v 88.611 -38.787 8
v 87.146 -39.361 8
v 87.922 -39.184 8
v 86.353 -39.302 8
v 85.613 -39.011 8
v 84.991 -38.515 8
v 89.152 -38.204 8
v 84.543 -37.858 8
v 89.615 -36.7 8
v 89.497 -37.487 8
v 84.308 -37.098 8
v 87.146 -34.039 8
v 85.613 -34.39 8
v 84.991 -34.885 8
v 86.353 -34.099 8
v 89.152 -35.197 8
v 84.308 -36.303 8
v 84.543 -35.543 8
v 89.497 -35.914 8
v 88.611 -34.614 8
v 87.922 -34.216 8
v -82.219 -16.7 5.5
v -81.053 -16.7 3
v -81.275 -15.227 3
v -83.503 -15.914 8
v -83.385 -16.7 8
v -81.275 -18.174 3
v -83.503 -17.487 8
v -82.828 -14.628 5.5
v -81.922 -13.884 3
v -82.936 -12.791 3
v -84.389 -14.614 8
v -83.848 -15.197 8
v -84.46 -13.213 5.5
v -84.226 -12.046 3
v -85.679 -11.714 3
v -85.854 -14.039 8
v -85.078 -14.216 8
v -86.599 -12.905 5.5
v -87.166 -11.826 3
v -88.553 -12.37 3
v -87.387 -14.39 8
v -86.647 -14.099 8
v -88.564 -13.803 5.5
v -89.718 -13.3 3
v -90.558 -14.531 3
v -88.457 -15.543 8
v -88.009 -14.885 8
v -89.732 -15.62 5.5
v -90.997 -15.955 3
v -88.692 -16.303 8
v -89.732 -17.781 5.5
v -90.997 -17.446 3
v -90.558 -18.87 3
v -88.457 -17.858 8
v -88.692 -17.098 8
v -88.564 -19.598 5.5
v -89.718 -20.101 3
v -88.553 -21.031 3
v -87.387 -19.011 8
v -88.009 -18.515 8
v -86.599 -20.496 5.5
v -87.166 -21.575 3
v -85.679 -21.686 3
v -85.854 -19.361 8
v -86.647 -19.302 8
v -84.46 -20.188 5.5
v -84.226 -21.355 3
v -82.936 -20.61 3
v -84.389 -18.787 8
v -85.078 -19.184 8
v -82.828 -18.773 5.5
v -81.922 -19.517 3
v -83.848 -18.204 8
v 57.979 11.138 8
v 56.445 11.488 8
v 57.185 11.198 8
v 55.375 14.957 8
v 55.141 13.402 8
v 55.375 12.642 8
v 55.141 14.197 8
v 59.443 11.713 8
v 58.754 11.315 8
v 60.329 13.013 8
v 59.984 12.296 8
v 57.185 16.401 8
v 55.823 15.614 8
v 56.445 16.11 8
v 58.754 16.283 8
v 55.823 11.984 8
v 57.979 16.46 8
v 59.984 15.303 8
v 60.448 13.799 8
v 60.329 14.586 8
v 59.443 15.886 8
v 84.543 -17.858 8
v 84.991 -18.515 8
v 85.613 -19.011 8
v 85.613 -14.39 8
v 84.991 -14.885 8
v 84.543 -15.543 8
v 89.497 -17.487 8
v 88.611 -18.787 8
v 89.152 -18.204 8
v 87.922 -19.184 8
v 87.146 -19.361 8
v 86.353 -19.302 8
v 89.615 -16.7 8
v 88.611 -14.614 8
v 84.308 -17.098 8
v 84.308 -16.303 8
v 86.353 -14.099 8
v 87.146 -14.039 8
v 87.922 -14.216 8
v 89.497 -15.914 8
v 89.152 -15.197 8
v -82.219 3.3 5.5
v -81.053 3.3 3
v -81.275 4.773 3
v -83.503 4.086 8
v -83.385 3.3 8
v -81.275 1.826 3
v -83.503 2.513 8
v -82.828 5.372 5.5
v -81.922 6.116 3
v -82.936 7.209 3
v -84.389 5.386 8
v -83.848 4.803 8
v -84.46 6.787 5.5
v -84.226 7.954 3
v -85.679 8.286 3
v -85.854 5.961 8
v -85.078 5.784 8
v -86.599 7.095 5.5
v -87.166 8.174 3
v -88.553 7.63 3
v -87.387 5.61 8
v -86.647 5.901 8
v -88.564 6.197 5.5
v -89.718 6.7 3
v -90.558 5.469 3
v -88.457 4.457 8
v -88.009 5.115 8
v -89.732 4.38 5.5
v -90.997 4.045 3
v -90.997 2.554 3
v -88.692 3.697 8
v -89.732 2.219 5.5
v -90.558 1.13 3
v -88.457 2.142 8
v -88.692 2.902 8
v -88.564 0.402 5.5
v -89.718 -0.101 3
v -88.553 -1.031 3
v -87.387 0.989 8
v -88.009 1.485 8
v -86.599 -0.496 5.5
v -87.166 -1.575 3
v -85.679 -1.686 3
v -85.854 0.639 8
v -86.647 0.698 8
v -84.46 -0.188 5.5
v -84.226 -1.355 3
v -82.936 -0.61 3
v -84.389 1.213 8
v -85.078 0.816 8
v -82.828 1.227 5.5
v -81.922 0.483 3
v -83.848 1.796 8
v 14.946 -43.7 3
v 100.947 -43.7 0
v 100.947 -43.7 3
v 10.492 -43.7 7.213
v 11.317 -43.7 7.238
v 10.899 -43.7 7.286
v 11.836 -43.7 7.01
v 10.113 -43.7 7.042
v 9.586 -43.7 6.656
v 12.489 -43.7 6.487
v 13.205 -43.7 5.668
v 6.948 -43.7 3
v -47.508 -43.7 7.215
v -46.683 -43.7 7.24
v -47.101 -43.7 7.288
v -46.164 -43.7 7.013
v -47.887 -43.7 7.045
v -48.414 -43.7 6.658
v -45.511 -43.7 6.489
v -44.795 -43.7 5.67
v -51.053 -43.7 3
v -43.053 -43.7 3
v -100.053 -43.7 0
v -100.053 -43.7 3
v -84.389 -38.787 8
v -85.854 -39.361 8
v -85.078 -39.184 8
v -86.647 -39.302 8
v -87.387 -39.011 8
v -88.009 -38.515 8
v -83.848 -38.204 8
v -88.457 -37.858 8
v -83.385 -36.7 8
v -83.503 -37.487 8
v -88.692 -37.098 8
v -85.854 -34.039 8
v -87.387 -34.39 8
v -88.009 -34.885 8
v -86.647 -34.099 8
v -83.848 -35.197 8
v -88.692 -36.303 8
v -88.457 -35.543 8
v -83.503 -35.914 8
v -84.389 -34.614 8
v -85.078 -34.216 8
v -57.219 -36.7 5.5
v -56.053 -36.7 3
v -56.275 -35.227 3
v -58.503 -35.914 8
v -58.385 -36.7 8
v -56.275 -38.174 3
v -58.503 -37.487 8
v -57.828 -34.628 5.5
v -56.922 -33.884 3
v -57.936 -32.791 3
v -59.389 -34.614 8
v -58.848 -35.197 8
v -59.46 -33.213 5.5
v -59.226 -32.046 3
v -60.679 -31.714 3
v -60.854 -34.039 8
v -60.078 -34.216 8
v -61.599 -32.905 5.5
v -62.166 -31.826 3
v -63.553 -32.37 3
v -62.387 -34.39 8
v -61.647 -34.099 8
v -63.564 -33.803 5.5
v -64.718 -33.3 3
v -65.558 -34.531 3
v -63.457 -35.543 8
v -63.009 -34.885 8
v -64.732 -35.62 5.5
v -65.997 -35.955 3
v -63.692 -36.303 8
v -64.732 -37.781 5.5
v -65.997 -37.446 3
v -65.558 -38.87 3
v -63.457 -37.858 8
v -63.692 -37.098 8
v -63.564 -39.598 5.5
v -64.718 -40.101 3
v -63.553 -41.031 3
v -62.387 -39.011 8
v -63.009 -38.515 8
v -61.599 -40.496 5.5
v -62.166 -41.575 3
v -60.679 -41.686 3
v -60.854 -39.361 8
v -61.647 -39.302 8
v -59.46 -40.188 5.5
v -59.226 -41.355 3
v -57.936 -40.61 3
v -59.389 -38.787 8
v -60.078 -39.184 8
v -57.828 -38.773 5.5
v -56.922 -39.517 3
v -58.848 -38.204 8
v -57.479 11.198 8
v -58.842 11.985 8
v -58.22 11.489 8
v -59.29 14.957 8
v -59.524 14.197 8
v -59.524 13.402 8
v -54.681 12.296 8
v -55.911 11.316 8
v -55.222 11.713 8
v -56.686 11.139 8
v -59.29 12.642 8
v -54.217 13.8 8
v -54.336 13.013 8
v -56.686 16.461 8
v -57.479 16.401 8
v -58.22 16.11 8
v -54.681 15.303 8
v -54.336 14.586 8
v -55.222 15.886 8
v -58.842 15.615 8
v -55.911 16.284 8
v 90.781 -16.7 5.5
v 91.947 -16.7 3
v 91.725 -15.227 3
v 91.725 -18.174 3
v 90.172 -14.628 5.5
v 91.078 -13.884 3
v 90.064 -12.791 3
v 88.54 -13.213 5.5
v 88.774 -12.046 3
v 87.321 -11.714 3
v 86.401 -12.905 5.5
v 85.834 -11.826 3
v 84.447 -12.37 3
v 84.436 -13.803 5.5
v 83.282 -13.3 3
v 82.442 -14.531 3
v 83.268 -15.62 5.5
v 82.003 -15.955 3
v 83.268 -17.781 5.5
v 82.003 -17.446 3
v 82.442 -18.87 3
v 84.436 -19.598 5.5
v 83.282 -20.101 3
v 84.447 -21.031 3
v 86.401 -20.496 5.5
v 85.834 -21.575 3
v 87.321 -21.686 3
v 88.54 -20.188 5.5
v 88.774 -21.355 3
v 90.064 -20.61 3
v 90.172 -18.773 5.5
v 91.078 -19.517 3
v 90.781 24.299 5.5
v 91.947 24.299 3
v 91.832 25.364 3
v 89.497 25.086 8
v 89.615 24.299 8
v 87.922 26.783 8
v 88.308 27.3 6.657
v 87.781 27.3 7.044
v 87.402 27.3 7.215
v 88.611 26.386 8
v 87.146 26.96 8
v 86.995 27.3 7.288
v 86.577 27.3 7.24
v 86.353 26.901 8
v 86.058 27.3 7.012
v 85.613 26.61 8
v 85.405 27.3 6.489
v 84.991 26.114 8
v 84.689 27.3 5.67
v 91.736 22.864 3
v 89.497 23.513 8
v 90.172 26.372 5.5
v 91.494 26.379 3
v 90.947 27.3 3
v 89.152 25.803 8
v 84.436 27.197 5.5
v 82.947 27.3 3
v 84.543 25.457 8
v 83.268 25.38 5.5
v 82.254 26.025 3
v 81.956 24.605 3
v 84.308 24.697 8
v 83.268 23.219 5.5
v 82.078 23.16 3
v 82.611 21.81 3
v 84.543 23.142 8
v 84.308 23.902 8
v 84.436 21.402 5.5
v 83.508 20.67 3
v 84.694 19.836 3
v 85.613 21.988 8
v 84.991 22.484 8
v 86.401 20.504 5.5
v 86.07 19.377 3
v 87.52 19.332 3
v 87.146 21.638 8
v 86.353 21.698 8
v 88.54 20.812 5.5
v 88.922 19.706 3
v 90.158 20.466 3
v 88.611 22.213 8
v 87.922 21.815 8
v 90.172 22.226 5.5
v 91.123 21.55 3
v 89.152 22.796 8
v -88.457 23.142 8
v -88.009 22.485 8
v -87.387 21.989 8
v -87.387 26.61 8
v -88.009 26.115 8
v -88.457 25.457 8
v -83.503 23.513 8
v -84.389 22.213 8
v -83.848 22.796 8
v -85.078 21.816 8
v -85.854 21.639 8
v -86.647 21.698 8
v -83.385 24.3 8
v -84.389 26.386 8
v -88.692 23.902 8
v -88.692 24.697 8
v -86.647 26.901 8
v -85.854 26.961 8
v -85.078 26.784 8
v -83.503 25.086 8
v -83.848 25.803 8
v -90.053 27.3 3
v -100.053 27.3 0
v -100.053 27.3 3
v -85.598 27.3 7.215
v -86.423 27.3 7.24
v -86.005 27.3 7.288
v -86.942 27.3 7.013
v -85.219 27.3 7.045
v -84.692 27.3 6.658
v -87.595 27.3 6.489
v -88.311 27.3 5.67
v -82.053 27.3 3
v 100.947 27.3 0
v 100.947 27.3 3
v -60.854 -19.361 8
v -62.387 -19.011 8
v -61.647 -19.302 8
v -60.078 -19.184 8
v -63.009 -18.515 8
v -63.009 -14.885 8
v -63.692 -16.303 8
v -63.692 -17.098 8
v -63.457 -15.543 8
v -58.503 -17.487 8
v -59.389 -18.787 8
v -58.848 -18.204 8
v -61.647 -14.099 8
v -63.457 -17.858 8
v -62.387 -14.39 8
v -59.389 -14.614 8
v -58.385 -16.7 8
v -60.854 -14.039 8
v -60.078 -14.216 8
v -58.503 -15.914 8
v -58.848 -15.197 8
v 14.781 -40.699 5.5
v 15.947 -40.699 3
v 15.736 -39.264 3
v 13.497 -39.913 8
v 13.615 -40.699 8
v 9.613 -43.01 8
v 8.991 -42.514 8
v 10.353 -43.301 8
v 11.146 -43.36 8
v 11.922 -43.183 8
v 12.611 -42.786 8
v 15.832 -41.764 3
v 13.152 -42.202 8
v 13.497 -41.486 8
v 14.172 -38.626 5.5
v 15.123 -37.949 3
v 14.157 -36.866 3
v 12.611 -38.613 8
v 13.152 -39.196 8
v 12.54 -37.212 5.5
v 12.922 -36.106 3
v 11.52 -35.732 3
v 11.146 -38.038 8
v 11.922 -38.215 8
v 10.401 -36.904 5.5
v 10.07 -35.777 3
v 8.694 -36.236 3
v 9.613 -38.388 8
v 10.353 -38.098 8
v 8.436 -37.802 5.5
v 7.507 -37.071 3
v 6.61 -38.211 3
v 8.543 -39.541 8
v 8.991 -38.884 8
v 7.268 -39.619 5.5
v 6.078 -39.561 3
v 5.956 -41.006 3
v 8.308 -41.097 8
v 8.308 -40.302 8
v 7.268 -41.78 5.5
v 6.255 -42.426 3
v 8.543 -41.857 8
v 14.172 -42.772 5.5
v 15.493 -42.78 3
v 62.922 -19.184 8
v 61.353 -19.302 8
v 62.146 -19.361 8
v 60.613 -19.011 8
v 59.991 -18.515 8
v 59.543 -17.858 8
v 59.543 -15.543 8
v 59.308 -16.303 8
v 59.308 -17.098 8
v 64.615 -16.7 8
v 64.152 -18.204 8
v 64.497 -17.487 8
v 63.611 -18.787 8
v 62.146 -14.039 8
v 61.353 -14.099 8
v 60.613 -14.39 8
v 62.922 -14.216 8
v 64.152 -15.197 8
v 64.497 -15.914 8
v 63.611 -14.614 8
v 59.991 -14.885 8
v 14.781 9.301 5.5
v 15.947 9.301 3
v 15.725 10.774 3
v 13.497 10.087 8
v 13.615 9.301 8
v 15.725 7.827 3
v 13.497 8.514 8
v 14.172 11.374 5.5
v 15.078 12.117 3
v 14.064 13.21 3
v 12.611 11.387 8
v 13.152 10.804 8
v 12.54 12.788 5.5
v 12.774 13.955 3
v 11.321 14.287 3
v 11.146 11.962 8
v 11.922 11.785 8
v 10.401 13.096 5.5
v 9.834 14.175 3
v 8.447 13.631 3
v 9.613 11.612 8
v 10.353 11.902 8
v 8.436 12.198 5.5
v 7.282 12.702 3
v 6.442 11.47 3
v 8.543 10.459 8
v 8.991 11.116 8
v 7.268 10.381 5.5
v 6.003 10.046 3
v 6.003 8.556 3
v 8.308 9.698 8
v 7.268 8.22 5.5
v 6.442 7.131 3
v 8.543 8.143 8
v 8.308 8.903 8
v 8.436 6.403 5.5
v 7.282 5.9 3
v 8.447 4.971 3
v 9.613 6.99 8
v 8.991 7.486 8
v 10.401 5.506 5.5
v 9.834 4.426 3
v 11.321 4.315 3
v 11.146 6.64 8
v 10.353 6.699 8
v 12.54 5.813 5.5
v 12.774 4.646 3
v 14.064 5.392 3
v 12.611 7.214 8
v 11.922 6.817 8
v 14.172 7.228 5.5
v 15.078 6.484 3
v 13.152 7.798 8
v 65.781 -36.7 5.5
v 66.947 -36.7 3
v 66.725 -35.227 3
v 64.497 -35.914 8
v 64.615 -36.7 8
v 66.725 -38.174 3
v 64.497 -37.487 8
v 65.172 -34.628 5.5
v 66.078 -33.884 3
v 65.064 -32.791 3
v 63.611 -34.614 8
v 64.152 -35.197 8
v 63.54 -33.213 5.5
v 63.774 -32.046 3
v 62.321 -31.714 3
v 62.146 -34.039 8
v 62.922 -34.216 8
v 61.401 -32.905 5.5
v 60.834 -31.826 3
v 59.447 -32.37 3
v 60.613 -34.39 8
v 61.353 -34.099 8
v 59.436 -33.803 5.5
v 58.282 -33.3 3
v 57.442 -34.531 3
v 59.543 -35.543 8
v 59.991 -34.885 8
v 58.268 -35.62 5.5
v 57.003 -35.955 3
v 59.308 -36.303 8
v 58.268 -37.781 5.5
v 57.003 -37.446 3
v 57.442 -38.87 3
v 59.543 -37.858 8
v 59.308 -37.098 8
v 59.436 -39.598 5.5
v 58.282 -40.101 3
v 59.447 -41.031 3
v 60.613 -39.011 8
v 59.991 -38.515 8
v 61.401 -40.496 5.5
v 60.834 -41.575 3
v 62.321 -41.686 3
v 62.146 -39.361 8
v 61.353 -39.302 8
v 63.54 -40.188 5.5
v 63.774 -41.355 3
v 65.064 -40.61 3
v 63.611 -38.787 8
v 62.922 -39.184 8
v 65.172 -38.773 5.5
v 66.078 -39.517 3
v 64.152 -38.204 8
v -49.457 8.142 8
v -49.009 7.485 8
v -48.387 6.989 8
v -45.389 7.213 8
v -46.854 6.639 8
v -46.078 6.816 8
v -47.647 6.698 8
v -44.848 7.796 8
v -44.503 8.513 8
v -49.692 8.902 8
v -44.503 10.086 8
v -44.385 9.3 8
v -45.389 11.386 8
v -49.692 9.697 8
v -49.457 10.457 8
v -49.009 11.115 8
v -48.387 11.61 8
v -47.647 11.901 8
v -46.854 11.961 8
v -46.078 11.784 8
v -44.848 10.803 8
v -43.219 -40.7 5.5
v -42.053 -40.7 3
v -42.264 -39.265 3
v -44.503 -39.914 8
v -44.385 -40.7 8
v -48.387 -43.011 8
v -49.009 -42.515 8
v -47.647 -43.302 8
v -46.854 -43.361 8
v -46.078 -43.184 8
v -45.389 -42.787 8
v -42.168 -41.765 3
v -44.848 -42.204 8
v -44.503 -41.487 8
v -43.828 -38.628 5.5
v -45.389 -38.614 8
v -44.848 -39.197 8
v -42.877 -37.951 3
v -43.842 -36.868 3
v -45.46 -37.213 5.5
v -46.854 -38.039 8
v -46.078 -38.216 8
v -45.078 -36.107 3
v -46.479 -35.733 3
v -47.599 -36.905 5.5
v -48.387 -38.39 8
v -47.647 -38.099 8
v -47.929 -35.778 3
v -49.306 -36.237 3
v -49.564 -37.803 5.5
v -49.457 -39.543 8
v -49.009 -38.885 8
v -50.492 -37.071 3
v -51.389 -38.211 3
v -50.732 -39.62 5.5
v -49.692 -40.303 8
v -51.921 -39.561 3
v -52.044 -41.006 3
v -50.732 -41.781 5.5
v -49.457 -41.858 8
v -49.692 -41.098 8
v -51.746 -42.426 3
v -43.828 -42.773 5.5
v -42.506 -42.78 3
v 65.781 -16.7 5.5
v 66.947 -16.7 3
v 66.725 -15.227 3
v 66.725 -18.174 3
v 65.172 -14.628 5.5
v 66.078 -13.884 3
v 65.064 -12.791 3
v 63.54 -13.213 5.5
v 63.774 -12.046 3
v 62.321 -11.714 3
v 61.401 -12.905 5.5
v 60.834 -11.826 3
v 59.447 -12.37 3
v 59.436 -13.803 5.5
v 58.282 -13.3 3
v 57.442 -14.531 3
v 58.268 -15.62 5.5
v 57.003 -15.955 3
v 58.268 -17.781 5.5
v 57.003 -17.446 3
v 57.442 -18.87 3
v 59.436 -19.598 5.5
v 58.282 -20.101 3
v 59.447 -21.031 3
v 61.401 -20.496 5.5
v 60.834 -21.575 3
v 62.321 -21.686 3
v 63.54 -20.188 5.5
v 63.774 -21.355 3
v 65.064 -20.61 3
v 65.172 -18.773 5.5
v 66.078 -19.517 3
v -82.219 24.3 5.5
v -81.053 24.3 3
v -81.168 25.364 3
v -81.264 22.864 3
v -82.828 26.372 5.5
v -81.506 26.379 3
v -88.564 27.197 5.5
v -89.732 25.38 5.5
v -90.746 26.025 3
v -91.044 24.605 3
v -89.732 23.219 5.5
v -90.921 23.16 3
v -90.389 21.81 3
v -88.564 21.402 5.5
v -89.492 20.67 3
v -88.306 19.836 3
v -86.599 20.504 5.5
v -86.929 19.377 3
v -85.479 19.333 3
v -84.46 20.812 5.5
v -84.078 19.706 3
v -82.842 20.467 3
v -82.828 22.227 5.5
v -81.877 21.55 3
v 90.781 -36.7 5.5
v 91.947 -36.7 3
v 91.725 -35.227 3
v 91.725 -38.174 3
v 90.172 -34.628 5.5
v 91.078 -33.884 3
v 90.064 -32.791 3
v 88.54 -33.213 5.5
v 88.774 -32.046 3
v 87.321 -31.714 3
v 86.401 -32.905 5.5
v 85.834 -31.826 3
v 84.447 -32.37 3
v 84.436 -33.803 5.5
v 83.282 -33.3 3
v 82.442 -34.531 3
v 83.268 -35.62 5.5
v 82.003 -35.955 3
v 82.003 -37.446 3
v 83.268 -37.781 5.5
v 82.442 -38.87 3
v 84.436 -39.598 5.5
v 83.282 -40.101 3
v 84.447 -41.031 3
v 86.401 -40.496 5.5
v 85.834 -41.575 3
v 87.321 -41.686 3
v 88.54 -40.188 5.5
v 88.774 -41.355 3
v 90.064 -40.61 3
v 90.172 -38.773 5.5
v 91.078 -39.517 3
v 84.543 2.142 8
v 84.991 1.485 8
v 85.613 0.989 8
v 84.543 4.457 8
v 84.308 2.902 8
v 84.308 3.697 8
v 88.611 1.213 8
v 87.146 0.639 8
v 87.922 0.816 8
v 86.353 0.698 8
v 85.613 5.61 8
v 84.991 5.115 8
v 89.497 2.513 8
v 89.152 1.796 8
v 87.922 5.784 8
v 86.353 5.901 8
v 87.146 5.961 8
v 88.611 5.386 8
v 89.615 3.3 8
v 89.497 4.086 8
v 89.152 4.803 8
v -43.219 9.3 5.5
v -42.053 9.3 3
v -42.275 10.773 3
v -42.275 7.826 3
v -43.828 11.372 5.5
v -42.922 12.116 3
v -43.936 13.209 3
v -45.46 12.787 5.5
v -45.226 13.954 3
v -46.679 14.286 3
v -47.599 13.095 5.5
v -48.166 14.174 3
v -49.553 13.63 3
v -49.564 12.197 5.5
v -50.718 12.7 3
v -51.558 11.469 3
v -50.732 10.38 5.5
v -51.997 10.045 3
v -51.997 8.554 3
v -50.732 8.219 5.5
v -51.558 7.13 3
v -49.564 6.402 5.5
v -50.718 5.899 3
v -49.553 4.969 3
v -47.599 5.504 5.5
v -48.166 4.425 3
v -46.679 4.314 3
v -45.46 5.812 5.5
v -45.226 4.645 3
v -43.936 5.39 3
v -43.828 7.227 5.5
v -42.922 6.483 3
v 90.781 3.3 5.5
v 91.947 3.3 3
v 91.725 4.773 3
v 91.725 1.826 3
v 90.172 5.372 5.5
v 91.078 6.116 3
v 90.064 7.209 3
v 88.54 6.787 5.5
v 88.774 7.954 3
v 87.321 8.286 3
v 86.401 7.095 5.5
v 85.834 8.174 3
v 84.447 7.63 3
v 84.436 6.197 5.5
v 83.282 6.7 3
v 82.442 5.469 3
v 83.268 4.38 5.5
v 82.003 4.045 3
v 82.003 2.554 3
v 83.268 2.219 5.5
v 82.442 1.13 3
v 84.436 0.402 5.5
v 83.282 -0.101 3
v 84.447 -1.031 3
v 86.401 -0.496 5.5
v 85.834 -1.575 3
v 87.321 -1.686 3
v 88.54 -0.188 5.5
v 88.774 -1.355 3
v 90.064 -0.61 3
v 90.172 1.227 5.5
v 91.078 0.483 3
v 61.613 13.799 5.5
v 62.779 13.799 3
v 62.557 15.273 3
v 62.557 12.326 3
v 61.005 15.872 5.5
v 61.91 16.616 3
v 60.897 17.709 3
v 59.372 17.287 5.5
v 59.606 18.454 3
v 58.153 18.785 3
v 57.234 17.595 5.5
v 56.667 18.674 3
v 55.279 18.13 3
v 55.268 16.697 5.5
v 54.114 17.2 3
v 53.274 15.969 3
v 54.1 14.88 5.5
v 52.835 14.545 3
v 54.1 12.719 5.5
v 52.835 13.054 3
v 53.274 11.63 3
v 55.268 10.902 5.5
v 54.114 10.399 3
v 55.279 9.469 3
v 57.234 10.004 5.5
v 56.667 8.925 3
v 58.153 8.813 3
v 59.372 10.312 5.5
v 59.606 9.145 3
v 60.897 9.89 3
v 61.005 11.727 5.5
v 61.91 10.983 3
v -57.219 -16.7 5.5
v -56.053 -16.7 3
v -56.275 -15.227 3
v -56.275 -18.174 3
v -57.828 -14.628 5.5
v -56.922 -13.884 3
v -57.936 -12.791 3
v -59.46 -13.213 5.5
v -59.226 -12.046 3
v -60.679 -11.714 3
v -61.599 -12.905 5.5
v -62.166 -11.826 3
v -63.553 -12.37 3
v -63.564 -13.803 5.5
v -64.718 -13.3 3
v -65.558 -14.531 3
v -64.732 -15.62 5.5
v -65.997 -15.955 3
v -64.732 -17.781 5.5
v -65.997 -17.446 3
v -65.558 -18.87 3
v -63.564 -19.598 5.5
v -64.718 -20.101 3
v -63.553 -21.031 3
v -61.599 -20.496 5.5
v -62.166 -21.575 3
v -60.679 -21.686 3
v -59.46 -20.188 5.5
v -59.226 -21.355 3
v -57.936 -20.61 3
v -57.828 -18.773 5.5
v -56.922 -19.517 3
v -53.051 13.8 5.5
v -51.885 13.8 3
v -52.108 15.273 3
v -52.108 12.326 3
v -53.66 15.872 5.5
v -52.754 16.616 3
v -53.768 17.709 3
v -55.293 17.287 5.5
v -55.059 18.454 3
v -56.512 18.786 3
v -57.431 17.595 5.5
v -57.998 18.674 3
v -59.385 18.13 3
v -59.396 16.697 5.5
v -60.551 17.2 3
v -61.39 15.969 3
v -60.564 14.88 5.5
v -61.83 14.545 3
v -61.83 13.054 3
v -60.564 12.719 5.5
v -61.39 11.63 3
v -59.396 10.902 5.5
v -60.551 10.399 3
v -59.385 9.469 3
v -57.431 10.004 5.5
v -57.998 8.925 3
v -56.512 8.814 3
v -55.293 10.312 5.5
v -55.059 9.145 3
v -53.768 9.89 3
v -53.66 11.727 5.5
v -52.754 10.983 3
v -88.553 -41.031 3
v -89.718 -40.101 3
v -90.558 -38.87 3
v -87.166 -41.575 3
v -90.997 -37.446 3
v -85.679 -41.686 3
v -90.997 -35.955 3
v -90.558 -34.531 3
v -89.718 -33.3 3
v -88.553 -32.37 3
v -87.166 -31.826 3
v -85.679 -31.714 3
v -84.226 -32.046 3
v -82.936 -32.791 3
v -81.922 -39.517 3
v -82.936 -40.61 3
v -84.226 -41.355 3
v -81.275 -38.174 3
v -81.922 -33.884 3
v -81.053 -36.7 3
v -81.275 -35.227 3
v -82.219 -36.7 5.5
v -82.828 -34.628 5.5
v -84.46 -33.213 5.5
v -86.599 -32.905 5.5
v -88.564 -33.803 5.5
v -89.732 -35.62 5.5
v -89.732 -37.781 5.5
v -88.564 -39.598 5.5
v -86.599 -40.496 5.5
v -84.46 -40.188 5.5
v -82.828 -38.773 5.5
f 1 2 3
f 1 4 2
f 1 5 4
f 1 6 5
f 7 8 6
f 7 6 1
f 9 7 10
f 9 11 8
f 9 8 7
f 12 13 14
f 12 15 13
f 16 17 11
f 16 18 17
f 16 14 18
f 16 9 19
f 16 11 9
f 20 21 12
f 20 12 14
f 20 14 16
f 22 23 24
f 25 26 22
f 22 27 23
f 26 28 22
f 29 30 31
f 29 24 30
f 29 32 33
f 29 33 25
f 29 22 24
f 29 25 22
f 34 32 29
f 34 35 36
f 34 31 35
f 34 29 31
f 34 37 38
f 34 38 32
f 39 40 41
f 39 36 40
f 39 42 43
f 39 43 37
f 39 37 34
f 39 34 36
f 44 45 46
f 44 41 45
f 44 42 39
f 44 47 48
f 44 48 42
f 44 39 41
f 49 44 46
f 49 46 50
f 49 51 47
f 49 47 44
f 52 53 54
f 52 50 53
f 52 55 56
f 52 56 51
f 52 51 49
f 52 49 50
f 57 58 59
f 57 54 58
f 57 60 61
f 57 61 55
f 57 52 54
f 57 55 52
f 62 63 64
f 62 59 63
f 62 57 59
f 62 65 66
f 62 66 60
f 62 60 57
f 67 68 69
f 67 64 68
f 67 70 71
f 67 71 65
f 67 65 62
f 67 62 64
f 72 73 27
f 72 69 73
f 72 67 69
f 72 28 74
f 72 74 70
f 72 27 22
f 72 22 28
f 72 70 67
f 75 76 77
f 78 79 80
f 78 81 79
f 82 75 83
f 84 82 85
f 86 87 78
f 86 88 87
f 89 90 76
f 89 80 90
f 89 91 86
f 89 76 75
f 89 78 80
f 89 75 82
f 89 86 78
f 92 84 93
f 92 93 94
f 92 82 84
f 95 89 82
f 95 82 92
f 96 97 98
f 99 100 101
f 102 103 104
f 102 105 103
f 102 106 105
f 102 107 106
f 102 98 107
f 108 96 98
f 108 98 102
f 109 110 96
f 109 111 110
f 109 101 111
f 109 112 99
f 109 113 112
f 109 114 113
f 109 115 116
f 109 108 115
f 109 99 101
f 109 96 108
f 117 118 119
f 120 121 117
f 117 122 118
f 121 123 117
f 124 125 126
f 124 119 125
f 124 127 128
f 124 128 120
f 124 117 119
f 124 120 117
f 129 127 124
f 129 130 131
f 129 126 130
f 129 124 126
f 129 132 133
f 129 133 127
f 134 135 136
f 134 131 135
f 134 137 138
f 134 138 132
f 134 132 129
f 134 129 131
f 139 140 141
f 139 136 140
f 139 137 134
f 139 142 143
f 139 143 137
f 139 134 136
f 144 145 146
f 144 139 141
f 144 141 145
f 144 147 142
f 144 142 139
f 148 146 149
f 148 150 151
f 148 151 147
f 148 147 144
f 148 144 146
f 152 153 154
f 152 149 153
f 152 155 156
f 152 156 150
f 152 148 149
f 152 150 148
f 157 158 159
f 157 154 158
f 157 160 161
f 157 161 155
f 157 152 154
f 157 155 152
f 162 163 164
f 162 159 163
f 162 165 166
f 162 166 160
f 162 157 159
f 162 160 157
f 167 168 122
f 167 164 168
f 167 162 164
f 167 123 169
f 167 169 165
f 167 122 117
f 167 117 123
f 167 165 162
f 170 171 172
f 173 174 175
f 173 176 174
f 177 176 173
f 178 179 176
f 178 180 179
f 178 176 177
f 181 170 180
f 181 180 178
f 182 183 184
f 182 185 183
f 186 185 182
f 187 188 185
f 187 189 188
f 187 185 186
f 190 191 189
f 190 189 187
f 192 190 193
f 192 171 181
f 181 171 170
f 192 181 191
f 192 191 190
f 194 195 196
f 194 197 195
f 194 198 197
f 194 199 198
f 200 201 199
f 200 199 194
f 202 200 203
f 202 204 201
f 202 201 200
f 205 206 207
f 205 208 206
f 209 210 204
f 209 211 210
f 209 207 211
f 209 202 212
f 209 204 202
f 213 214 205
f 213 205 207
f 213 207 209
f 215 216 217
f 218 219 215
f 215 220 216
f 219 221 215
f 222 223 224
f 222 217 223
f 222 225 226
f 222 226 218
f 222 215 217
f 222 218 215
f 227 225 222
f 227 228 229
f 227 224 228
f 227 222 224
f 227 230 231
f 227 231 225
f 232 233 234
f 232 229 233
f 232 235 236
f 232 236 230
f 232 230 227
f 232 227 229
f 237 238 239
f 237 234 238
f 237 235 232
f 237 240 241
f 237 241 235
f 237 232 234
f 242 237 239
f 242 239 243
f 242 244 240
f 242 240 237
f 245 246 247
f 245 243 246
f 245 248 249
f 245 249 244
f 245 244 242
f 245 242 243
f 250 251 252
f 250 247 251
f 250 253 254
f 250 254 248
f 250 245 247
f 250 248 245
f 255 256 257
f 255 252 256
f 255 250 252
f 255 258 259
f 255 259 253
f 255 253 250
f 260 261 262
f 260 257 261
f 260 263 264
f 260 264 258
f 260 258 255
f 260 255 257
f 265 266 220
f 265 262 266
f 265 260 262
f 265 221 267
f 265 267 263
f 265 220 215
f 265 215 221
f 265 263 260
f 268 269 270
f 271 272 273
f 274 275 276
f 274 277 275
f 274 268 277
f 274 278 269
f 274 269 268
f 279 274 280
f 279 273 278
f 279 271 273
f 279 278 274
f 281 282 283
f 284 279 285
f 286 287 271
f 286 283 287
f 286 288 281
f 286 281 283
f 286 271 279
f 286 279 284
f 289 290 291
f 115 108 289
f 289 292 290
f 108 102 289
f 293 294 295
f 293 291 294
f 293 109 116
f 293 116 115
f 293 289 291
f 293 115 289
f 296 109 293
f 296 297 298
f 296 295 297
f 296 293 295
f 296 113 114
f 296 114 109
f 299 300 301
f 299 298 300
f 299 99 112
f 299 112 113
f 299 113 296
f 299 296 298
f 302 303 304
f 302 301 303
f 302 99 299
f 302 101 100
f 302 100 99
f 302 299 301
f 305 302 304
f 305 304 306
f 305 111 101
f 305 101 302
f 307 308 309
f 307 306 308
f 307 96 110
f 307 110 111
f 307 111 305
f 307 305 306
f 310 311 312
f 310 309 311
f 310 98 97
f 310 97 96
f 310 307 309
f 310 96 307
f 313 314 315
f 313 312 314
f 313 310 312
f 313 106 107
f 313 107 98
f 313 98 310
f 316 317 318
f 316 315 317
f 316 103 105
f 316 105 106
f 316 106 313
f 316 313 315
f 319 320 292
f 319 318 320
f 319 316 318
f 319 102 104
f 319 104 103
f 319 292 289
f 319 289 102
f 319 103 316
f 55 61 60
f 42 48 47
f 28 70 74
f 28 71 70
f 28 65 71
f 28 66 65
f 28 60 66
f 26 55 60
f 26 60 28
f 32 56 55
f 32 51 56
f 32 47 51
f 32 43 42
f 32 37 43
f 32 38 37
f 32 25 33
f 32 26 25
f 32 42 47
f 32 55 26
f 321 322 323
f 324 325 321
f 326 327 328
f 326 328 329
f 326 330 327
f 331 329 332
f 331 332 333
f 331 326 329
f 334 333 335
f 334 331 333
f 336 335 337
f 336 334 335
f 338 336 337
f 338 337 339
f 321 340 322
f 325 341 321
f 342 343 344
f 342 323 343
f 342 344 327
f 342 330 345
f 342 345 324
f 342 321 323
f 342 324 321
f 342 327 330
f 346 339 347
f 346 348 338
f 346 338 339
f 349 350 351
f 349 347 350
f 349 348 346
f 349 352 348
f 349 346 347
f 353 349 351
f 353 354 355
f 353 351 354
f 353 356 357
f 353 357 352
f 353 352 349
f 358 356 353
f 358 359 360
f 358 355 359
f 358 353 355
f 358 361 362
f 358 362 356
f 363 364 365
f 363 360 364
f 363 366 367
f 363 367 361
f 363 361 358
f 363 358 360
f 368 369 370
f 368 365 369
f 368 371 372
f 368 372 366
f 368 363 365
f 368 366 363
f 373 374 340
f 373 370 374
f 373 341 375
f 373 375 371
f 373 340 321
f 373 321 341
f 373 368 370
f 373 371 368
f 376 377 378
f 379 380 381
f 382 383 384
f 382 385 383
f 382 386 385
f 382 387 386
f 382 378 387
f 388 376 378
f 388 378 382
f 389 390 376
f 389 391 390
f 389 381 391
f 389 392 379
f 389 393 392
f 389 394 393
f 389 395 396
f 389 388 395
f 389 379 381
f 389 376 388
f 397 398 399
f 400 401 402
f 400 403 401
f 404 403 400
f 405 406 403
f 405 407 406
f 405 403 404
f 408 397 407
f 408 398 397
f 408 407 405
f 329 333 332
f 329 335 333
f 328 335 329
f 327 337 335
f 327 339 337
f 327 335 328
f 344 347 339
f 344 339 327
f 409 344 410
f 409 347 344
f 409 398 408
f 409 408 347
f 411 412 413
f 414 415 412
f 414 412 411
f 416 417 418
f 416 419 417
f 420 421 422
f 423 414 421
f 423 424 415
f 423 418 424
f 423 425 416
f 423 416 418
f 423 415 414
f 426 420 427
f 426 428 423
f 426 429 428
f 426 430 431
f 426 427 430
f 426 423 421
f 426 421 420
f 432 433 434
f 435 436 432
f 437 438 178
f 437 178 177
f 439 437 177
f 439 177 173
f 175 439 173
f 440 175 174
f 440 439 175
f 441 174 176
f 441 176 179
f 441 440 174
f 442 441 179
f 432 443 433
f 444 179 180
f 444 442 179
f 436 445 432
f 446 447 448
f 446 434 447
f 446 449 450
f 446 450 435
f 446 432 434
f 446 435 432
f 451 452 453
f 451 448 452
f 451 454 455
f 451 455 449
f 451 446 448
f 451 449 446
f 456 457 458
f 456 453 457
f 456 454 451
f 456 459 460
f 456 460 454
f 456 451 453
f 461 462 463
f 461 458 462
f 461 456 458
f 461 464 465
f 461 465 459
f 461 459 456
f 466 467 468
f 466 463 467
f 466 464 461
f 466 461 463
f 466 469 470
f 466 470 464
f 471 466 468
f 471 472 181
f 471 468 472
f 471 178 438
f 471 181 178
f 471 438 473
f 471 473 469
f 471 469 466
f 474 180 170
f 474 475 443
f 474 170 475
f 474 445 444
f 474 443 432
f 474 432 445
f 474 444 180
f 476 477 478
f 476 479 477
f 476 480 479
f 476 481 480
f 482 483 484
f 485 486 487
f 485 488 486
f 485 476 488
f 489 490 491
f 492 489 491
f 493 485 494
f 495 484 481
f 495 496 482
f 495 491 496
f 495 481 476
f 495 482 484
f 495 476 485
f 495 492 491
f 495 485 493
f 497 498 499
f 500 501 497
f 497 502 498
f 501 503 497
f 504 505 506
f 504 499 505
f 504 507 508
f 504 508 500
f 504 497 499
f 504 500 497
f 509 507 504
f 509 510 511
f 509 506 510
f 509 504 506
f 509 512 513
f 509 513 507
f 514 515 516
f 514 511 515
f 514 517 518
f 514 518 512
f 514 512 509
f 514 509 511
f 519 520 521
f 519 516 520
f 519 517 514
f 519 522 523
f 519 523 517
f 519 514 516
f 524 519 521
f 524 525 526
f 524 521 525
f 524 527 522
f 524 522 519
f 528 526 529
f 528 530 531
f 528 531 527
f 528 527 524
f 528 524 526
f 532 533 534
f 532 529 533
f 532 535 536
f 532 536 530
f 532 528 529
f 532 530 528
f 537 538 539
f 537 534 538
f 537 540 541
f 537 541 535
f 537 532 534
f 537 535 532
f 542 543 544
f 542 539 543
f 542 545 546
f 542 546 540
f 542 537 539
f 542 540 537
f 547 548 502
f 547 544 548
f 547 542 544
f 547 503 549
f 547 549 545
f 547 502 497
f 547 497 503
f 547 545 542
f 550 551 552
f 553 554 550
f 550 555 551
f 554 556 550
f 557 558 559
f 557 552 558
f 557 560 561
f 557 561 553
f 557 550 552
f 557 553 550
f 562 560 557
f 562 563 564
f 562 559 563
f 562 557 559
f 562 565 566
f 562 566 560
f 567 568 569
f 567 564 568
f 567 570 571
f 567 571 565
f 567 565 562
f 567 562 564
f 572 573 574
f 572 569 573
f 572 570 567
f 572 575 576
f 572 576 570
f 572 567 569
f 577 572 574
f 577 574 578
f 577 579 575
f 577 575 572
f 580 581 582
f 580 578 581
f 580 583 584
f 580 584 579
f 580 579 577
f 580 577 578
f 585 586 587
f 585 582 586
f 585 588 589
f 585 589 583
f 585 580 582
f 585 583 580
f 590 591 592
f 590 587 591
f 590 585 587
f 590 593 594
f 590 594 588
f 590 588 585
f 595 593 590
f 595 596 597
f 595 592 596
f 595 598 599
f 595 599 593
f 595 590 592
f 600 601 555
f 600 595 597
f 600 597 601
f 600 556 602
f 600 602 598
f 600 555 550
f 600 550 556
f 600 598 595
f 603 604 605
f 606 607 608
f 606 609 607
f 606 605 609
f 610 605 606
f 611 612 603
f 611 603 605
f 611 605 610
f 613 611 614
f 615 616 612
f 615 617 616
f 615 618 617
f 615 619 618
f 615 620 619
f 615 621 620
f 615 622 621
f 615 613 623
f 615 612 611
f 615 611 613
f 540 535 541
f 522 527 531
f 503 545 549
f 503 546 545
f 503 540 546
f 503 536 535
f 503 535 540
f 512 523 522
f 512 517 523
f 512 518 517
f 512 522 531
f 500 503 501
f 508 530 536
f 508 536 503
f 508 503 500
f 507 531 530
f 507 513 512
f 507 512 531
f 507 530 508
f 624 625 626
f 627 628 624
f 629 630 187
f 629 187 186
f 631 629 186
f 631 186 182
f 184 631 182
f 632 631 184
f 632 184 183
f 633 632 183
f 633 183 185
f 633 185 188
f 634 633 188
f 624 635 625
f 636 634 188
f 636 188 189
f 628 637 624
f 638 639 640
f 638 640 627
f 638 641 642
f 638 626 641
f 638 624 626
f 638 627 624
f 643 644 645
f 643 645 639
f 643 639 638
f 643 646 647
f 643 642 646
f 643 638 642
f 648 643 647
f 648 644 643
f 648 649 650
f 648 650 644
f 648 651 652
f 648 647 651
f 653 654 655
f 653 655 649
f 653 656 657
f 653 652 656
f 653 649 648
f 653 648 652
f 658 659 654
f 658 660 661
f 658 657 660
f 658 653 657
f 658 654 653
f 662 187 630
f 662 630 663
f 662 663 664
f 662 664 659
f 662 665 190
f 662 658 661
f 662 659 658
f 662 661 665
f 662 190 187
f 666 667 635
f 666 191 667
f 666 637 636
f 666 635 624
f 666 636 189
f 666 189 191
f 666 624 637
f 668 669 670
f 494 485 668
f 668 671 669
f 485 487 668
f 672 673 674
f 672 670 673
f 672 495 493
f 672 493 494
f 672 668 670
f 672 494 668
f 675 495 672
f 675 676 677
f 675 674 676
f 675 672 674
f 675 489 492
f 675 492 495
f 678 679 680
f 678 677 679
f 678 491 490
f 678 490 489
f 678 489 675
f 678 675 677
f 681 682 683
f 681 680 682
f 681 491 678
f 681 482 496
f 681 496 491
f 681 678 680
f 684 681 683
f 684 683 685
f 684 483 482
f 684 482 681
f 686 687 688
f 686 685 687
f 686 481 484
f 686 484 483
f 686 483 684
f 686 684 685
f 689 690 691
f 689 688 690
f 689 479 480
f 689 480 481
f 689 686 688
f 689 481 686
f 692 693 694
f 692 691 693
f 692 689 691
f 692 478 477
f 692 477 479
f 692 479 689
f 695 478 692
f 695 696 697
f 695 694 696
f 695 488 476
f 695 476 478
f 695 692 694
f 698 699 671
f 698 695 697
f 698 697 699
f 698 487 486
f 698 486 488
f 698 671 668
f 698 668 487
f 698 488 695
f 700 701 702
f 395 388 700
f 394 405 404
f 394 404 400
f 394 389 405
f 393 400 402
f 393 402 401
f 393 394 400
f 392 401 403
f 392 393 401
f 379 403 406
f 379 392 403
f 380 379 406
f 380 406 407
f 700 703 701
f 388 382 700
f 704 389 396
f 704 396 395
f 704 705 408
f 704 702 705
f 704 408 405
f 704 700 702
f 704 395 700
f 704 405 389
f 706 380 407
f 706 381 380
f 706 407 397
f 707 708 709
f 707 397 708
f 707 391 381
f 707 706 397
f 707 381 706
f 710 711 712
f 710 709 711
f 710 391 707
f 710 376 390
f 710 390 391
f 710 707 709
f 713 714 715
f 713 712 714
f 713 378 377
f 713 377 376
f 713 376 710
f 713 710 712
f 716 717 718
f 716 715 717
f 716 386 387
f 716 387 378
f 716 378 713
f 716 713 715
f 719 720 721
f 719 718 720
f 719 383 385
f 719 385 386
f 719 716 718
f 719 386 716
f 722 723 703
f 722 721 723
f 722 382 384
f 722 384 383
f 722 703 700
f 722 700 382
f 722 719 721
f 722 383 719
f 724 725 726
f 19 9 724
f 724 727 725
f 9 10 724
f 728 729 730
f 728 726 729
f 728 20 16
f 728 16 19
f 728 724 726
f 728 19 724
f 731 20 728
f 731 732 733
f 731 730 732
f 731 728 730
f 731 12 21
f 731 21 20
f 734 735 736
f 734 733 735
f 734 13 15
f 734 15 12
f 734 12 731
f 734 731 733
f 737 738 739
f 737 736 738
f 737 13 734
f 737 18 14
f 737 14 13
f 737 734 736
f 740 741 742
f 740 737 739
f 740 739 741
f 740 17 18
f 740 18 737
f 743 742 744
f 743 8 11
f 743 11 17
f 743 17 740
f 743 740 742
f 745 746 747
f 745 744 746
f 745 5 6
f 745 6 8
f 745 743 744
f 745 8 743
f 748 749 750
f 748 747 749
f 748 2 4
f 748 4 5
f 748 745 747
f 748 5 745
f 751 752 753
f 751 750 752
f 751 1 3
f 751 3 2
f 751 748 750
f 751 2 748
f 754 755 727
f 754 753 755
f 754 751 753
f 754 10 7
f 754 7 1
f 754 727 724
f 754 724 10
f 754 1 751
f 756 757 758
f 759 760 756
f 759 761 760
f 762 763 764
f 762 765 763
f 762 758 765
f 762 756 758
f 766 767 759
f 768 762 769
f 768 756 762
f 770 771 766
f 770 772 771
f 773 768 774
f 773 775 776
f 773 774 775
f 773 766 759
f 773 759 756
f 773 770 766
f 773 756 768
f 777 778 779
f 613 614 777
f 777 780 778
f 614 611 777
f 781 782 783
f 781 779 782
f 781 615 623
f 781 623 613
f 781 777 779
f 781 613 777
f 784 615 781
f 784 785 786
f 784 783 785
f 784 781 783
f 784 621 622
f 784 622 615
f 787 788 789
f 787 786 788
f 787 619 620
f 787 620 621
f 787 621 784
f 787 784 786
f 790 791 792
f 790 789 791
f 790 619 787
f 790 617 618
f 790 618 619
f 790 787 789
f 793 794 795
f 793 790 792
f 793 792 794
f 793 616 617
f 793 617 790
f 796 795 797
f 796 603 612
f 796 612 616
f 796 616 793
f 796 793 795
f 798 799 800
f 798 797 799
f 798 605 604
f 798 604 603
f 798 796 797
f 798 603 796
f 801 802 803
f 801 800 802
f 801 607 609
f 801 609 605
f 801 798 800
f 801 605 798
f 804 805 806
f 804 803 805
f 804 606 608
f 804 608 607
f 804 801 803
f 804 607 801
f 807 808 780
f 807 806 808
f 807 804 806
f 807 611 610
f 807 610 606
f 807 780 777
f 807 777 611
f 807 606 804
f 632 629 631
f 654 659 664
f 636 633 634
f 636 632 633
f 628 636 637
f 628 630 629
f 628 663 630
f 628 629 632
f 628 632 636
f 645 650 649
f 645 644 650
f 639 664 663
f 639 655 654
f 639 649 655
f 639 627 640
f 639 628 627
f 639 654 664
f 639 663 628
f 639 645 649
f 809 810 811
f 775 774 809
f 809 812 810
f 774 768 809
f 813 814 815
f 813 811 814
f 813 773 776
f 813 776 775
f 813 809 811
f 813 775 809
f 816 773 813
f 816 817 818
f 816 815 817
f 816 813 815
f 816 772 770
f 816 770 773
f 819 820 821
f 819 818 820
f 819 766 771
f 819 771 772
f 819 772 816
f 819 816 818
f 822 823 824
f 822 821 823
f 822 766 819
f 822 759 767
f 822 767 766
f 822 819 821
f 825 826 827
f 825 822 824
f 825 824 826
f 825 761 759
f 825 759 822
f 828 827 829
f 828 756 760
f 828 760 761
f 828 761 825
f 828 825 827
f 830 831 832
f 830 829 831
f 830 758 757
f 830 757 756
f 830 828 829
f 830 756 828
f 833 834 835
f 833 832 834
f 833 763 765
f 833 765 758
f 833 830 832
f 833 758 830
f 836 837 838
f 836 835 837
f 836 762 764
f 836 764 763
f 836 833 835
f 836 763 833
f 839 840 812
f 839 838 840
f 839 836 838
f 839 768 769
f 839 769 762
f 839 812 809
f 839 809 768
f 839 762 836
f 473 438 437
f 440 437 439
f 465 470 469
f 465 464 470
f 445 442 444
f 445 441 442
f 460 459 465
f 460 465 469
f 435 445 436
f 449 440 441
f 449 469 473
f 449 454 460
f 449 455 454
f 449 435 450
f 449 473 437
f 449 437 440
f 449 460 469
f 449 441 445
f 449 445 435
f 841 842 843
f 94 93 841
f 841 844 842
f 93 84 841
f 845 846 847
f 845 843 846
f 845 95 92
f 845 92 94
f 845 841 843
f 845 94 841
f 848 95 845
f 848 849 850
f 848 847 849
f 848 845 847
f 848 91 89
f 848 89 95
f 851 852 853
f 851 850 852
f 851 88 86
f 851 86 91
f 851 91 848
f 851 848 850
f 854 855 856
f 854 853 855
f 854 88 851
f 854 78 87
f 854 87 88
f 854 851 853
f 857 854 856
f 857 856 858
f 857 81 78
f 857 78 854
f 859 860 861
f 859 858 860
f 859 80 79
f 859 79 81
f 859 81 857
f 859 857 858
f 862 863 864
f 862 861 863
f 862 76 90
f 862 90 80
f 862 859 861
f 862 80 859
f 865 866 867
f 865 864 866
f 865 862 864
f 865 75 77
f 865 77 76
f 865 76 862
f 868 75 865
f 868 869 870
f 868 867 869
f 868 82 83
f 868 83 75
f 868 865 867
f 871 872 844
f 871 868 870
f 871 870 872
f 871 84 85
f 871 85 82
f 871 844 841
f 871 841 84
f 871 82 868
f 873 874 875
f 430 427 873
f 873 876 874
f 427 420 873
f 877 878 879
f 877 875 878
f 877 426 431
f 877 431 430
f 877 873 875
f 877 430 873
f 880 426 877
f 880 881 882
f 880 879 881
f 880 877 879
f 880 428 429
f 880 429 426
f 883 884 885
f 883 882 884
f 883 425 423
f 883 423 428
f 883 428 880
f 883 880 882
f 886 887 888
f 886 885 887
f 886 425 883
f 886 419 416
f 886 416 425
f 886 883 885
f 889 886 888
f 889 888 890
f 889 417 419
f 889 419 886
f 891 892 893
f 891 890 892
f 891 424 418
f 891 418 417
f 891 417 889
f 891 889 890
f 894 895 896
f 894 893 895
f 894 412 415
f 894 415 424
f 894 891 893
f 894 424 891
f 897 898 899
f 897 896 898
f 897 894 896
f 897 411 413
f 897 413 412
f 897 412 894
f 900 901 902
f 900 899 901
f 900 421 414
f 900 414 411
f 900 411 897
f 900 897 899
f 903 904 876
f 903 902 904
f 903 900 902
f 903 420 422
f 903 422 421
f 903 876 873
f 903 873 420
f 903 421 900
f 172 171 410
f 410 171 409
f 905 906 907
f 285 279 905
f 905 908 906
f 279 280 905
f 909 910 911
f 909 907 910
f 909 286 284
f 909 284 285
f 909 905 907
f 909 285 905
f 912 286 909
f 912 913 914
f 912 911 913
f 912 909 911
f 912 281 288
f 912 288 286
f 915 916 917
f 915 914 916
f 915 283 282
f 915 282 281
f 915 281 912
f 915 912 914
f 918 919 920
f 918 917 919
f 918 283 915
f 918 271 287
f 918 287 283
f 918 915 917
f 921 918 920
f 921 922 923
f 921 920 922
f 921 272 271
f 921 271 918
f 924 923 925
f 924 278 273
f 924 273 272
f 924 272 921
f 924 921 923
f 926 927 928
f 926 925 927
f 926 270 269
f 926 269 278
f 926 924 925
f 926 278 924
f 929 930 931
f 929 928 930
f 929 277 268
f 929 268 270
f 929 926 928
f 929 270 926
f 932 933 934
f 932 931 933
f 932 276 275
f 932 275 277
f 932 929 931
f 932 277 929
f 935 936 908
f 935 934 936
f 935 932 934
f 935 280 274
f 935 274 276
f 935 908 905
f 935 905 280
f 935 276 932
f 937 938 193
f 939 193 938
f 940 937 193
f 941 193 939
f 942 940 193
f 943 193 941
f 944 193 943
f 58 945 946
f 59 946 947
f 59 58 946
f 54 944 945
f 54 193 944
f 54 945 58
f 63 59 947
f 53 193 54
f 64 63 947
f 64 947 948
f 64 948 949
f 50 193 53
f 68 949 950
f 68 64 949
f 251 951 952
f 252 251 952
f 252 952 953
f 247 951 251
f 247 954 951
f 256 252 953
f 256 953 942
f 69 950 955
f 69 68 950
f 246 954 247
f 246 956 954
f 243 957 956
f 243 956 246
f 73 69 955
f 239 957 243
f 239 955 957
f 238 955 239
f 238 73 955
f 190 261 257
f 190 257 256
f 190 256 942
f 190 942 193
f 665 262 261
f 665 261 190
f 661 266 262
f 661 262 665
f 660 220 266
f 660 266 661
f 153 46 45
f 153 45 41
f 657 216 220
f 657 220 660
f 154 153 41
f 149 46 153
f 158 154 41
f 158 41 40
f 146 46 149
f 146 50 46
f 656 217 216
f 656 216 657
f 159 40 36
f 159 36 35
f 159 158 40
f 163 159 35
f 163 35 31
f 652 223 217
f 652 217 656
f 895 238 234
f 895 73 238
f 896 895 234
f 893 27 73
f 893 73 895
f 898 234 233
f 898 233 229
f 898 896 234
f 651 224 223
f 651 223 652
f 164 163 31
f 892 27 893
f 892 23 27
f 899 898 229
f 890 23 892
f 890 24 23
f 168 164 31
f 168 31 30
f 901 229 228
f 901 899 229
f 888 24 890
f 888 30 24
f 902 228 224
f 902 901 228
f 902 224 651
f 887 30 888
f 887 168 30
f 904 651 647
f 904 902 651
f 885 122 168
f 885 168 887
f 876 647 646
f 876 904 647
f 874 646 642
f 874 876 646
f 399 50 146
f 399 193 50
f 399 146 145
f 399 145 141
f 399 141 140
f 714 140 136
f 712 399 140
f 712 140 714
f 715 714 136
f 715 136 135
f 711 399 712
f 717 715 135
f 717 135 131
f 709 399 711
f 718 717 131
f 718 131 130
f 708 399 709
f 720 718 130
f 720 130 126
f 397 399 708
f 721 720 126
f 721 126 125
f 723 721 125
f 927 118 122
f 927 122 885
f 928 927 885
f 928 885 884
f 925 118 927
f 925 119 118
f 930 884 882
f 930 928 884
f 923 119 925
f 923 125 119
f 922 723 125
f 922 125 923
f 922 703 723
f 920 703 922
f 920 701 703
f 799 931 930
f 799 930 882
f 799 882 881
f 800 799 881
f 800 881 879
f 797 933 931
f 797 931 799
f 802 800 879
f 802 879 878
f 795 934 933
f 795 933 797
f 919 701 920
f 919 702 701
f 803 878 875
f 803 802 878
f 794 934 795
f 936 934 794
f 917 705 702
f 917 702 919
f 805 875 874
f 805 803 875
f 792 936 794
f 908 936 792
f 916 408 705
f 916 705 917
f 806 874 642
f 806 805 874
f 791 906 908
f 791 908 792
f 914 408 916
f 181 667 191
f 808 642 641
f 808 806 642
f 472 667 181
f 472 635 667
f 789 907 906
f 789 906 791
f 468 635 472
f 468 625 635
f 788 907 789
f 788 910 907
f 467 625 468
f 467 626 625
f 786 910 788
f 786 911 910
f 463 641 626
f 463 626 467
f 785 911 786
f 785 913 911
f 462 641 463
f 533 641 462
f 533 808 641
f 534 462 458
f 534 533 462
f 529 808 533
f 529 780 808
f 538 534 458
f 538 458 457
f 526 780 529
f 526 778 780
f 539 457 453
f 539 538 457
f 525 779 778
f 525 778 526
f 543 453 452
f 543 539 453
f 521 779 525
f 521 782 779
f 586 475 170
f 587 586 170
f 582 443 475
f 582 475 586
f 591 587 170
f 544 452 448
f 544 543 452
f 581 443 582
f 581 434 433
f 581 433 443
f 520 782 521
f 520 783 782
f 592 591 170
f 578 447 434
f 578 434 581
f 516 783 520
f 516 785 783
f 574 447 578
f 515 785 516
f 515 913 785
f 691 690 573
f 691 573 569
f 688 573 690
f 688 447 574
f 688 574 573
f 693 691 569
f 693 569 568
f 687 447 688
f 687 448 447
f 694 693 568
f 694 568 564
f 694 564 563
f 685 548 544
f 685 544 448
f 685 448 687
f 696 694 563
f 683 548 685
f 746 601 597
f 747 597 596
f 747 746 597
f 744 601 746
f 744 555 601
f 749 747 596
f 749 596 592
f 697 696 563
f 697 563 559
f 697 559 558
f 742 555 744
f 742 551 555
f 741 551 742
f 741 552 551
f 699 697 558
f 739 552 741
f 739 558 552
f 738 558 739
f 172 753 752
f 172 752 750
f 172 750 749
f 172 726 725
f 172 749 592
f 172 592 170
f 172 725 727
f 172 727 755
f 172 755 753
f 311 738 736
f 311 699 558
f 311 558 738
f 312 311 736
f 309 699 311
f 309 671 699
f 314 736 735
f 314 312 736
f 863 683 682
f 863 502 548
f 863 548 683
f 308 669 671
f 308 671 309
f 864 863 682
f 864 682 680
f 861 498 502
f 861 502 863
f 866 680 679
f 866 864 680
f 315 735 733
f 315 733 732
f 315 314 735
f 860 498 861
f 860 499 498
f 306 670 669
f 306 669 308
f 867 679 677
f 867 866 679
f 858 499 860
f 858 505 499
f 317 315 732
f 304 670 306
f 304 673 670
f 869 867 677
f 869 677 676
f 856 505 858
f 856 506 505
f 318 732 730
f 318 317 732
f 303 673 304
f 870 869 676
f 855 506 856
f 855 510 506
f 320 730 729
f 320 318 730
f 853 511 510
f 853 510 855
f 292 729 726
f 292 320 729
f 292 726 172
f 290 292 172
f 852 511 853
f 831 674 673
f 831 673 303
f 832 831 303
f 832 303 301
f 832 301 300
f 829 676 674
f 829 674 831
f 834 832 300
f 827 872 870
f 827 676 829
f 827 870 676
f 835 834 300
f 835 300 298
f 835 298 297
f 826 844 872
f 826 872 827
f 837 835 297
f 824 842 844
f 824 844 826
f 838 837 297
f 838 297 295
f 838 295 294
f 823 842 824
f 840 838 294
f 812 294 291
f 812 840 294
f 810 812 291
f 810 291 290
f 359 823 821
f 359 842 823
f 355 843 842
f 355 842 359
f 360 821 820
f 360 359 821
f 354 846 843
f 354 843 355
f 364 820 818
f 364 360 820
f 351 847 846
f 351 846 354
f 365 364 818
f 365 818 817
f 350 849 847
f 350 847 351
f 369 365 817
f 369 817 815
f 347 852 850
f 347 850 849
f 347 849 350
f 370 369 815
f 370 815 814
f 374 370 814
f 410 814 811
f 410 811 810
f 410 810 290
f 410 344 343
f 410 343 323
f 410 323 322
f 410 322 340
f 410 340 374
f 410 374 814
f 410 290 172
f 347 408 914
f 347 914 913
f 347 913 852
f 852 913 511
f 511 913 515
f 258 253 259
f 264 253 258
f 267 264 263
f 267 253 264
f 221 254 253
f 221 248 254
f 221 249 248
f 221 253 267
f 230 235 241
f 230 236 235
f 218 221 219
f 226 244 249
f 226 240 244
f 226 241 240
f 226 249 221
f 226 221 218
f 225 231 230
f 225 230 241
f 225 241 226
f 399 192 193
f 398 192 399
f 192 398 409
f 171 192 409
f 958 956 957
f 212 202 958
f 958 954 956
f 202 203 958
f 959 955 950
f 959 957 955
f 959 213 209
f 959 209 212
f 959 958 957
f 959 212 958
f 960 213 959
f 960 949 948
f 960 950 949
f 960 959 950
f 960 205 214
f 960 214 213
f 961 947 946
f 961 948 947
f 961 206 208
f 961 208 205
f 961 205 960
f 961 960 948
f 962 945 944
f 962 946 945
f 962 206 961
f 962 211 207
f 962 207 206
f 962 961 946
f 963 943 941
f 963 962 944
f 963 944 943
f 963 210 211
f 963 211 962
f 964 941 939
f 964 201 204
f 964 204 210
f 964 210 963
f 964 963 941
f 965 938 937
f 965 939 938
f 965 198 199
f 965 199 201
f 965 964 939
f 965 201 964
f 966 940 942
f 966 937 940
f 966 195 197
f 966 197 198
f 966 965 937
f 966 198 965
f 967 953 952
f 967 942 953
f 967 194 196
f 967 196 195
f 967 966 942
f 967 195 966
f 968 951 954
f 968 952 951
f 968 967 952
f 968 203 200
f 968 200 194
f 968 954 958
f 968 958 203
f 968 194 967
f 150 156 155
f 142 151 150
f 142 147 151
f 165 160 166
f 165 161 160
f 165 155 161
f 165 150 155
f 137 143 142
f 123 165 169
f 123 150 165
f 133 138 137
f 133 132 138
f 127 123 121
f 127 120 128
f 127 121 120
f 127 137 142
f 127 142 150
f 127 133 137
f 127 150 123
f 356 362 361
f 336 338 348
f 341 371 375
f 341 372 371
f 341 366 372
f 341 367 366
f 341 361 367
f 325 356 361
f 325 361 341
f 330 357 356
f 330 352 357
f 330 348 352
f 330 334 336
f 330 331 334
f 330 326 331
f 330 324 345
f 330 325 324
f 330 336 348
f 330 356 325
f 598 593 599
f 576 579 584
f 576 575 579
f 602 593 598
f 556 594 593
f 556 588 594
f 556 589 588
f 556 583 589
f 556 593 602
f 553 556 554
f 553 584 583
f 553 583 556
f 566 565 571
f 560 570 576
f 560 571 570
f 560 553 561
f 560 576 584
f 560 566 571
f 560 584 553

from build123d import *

# Parameters (mm, degrees)
ESQUISSE2_W             = 201
ESQUISSE2_H             = 75
BOSS_EXTRU_1_DEPTH      = 3
ESQUISSE3_R             = 5
ESQUISSE3_R_2           = 4.999999998
BOSS_EXTRU_3_DEPTH      = 5
BOSS_EXTRU_3_TAPER      = 25
ESQUISSE4_W             = 210
ESQUISSE4_H             = 11.155958732
ENL_V_MAT_EXTRU_1_DEPTH = 2
ESQUISSE5_W             = 220
ESQUISSE5_H             = 18.927618919
ENL_V_MAT_EXTRU_2_DEPTH = 2


with BuildPart() as part:
    # Esquisse2 → Boss.-Extru.1 (new body)
    with BuildSketch(Plane.XY):
        with Locations((0.446886155, -8.200471698)):
            Rectangle(ESQUISSE2_W, ESQUISSE2_H)
    extrude(amount=BOSS_EXTRU_1_DEPTH)

    # Esquisse3 → Boss.-Extru.3 (add)
    with BuildSketch(Plane.XY.offset(3)):
        with Locations((-47.053113845, 9.299528302)):
            Circle(ESQUISSE3_R)
        with Locations((-47.053113845, -40.700471698)):
            Circle(ESQUISSE3_R)
        with Locations((10.946886143, 9.300717009)):
            Circle(ESQUISSE3_R)
        with Locations((10.946886143, -40.699282991)):
            Circle(ESQUISSE3_R)
        with Locations((-86.053113845, 24.299528302)):
            Circle(ESQUISSE3_R)
        with Locations((-56.885494813, 13.799528302)):
            Circle(ESQUISSE3_R)
        with Locations((-86.053113845, 3.299528302)):
            Circle(ESQUISSE3_R)
        with Locations((-86.053113845, -16.700471698)):
            Circle(ESQUISSE3_R)
        with Locations((-86.053113845, -36.700471698)):
            Circle(ESQUISSE3_R)
        with Locations((-61.053113845, -16.700471698)):
            Circle(ESQUISSE3_R_2)
        with Locations((-61.053113845, -36.700471698)):
            Circle(ESQUISSE3_R_2)
        with Locations((86.946886155, 24.299361822)):
            Circle(ESQUISSE3_R)
        with Locations((86.946886155, 3.299528302)):
            Circle(ESQUISSE3_R)
        with Locations((57.779237158, 13.799445062)):
            Circle(ESQUISSE3_R)
        with Locations((86.946886155, -16.700471698)):
            Circle(ESQUISSE3_R)
        with Locations((86.946886155, -36.700471698)):
            Circle(ESQUISSE3_R)
        with Locations((61.946886155, -36.700471698)):
            Circle(ESQUISSE3_R)
        with Locations((61.946886155, -16.700471698)):
            Circle(ESQUISSE3_R)
    extrude(amount=BOSS_EXTRU_3_DEPTH, taper=BOSS_EXTRU_3_TAPER)

    # Esquisse4 → Enlèv. mat.-Extru.1 (cut)
    with BuildSketch(Plane(origin=(0, 29.299528302, 0), x_dir=(1, 0, 0), z_dir=(0, 1, 0))):
        with Locations((1.418471148, -5.577979366)):
            Rectangle(ESQUISSE4_W, ESQUISSE4_H)
    extrude(amount=-ENL_V_MAT_EXTRU_1_DEPTH, mode=Mode.SUBTRACT)

    # Esquisse5 → Enlèv. mat.-Extru.2 (cut)
    with BuildSketch(Plane(origin=(0, -45.700471698, 0), x_dir=(-1, 0, 0), z_dir=(0, -1, 0))):
        with Locations((0.053113845, -9.46380946)):
            Rectangle(ESQUISSE5_W, ESQUISSE5_H)
    extrude(amount=-ENL_V_MAT_EXTRU_2_DEPTH, mode=Mode.SUBTRACT)


solid = part.part
